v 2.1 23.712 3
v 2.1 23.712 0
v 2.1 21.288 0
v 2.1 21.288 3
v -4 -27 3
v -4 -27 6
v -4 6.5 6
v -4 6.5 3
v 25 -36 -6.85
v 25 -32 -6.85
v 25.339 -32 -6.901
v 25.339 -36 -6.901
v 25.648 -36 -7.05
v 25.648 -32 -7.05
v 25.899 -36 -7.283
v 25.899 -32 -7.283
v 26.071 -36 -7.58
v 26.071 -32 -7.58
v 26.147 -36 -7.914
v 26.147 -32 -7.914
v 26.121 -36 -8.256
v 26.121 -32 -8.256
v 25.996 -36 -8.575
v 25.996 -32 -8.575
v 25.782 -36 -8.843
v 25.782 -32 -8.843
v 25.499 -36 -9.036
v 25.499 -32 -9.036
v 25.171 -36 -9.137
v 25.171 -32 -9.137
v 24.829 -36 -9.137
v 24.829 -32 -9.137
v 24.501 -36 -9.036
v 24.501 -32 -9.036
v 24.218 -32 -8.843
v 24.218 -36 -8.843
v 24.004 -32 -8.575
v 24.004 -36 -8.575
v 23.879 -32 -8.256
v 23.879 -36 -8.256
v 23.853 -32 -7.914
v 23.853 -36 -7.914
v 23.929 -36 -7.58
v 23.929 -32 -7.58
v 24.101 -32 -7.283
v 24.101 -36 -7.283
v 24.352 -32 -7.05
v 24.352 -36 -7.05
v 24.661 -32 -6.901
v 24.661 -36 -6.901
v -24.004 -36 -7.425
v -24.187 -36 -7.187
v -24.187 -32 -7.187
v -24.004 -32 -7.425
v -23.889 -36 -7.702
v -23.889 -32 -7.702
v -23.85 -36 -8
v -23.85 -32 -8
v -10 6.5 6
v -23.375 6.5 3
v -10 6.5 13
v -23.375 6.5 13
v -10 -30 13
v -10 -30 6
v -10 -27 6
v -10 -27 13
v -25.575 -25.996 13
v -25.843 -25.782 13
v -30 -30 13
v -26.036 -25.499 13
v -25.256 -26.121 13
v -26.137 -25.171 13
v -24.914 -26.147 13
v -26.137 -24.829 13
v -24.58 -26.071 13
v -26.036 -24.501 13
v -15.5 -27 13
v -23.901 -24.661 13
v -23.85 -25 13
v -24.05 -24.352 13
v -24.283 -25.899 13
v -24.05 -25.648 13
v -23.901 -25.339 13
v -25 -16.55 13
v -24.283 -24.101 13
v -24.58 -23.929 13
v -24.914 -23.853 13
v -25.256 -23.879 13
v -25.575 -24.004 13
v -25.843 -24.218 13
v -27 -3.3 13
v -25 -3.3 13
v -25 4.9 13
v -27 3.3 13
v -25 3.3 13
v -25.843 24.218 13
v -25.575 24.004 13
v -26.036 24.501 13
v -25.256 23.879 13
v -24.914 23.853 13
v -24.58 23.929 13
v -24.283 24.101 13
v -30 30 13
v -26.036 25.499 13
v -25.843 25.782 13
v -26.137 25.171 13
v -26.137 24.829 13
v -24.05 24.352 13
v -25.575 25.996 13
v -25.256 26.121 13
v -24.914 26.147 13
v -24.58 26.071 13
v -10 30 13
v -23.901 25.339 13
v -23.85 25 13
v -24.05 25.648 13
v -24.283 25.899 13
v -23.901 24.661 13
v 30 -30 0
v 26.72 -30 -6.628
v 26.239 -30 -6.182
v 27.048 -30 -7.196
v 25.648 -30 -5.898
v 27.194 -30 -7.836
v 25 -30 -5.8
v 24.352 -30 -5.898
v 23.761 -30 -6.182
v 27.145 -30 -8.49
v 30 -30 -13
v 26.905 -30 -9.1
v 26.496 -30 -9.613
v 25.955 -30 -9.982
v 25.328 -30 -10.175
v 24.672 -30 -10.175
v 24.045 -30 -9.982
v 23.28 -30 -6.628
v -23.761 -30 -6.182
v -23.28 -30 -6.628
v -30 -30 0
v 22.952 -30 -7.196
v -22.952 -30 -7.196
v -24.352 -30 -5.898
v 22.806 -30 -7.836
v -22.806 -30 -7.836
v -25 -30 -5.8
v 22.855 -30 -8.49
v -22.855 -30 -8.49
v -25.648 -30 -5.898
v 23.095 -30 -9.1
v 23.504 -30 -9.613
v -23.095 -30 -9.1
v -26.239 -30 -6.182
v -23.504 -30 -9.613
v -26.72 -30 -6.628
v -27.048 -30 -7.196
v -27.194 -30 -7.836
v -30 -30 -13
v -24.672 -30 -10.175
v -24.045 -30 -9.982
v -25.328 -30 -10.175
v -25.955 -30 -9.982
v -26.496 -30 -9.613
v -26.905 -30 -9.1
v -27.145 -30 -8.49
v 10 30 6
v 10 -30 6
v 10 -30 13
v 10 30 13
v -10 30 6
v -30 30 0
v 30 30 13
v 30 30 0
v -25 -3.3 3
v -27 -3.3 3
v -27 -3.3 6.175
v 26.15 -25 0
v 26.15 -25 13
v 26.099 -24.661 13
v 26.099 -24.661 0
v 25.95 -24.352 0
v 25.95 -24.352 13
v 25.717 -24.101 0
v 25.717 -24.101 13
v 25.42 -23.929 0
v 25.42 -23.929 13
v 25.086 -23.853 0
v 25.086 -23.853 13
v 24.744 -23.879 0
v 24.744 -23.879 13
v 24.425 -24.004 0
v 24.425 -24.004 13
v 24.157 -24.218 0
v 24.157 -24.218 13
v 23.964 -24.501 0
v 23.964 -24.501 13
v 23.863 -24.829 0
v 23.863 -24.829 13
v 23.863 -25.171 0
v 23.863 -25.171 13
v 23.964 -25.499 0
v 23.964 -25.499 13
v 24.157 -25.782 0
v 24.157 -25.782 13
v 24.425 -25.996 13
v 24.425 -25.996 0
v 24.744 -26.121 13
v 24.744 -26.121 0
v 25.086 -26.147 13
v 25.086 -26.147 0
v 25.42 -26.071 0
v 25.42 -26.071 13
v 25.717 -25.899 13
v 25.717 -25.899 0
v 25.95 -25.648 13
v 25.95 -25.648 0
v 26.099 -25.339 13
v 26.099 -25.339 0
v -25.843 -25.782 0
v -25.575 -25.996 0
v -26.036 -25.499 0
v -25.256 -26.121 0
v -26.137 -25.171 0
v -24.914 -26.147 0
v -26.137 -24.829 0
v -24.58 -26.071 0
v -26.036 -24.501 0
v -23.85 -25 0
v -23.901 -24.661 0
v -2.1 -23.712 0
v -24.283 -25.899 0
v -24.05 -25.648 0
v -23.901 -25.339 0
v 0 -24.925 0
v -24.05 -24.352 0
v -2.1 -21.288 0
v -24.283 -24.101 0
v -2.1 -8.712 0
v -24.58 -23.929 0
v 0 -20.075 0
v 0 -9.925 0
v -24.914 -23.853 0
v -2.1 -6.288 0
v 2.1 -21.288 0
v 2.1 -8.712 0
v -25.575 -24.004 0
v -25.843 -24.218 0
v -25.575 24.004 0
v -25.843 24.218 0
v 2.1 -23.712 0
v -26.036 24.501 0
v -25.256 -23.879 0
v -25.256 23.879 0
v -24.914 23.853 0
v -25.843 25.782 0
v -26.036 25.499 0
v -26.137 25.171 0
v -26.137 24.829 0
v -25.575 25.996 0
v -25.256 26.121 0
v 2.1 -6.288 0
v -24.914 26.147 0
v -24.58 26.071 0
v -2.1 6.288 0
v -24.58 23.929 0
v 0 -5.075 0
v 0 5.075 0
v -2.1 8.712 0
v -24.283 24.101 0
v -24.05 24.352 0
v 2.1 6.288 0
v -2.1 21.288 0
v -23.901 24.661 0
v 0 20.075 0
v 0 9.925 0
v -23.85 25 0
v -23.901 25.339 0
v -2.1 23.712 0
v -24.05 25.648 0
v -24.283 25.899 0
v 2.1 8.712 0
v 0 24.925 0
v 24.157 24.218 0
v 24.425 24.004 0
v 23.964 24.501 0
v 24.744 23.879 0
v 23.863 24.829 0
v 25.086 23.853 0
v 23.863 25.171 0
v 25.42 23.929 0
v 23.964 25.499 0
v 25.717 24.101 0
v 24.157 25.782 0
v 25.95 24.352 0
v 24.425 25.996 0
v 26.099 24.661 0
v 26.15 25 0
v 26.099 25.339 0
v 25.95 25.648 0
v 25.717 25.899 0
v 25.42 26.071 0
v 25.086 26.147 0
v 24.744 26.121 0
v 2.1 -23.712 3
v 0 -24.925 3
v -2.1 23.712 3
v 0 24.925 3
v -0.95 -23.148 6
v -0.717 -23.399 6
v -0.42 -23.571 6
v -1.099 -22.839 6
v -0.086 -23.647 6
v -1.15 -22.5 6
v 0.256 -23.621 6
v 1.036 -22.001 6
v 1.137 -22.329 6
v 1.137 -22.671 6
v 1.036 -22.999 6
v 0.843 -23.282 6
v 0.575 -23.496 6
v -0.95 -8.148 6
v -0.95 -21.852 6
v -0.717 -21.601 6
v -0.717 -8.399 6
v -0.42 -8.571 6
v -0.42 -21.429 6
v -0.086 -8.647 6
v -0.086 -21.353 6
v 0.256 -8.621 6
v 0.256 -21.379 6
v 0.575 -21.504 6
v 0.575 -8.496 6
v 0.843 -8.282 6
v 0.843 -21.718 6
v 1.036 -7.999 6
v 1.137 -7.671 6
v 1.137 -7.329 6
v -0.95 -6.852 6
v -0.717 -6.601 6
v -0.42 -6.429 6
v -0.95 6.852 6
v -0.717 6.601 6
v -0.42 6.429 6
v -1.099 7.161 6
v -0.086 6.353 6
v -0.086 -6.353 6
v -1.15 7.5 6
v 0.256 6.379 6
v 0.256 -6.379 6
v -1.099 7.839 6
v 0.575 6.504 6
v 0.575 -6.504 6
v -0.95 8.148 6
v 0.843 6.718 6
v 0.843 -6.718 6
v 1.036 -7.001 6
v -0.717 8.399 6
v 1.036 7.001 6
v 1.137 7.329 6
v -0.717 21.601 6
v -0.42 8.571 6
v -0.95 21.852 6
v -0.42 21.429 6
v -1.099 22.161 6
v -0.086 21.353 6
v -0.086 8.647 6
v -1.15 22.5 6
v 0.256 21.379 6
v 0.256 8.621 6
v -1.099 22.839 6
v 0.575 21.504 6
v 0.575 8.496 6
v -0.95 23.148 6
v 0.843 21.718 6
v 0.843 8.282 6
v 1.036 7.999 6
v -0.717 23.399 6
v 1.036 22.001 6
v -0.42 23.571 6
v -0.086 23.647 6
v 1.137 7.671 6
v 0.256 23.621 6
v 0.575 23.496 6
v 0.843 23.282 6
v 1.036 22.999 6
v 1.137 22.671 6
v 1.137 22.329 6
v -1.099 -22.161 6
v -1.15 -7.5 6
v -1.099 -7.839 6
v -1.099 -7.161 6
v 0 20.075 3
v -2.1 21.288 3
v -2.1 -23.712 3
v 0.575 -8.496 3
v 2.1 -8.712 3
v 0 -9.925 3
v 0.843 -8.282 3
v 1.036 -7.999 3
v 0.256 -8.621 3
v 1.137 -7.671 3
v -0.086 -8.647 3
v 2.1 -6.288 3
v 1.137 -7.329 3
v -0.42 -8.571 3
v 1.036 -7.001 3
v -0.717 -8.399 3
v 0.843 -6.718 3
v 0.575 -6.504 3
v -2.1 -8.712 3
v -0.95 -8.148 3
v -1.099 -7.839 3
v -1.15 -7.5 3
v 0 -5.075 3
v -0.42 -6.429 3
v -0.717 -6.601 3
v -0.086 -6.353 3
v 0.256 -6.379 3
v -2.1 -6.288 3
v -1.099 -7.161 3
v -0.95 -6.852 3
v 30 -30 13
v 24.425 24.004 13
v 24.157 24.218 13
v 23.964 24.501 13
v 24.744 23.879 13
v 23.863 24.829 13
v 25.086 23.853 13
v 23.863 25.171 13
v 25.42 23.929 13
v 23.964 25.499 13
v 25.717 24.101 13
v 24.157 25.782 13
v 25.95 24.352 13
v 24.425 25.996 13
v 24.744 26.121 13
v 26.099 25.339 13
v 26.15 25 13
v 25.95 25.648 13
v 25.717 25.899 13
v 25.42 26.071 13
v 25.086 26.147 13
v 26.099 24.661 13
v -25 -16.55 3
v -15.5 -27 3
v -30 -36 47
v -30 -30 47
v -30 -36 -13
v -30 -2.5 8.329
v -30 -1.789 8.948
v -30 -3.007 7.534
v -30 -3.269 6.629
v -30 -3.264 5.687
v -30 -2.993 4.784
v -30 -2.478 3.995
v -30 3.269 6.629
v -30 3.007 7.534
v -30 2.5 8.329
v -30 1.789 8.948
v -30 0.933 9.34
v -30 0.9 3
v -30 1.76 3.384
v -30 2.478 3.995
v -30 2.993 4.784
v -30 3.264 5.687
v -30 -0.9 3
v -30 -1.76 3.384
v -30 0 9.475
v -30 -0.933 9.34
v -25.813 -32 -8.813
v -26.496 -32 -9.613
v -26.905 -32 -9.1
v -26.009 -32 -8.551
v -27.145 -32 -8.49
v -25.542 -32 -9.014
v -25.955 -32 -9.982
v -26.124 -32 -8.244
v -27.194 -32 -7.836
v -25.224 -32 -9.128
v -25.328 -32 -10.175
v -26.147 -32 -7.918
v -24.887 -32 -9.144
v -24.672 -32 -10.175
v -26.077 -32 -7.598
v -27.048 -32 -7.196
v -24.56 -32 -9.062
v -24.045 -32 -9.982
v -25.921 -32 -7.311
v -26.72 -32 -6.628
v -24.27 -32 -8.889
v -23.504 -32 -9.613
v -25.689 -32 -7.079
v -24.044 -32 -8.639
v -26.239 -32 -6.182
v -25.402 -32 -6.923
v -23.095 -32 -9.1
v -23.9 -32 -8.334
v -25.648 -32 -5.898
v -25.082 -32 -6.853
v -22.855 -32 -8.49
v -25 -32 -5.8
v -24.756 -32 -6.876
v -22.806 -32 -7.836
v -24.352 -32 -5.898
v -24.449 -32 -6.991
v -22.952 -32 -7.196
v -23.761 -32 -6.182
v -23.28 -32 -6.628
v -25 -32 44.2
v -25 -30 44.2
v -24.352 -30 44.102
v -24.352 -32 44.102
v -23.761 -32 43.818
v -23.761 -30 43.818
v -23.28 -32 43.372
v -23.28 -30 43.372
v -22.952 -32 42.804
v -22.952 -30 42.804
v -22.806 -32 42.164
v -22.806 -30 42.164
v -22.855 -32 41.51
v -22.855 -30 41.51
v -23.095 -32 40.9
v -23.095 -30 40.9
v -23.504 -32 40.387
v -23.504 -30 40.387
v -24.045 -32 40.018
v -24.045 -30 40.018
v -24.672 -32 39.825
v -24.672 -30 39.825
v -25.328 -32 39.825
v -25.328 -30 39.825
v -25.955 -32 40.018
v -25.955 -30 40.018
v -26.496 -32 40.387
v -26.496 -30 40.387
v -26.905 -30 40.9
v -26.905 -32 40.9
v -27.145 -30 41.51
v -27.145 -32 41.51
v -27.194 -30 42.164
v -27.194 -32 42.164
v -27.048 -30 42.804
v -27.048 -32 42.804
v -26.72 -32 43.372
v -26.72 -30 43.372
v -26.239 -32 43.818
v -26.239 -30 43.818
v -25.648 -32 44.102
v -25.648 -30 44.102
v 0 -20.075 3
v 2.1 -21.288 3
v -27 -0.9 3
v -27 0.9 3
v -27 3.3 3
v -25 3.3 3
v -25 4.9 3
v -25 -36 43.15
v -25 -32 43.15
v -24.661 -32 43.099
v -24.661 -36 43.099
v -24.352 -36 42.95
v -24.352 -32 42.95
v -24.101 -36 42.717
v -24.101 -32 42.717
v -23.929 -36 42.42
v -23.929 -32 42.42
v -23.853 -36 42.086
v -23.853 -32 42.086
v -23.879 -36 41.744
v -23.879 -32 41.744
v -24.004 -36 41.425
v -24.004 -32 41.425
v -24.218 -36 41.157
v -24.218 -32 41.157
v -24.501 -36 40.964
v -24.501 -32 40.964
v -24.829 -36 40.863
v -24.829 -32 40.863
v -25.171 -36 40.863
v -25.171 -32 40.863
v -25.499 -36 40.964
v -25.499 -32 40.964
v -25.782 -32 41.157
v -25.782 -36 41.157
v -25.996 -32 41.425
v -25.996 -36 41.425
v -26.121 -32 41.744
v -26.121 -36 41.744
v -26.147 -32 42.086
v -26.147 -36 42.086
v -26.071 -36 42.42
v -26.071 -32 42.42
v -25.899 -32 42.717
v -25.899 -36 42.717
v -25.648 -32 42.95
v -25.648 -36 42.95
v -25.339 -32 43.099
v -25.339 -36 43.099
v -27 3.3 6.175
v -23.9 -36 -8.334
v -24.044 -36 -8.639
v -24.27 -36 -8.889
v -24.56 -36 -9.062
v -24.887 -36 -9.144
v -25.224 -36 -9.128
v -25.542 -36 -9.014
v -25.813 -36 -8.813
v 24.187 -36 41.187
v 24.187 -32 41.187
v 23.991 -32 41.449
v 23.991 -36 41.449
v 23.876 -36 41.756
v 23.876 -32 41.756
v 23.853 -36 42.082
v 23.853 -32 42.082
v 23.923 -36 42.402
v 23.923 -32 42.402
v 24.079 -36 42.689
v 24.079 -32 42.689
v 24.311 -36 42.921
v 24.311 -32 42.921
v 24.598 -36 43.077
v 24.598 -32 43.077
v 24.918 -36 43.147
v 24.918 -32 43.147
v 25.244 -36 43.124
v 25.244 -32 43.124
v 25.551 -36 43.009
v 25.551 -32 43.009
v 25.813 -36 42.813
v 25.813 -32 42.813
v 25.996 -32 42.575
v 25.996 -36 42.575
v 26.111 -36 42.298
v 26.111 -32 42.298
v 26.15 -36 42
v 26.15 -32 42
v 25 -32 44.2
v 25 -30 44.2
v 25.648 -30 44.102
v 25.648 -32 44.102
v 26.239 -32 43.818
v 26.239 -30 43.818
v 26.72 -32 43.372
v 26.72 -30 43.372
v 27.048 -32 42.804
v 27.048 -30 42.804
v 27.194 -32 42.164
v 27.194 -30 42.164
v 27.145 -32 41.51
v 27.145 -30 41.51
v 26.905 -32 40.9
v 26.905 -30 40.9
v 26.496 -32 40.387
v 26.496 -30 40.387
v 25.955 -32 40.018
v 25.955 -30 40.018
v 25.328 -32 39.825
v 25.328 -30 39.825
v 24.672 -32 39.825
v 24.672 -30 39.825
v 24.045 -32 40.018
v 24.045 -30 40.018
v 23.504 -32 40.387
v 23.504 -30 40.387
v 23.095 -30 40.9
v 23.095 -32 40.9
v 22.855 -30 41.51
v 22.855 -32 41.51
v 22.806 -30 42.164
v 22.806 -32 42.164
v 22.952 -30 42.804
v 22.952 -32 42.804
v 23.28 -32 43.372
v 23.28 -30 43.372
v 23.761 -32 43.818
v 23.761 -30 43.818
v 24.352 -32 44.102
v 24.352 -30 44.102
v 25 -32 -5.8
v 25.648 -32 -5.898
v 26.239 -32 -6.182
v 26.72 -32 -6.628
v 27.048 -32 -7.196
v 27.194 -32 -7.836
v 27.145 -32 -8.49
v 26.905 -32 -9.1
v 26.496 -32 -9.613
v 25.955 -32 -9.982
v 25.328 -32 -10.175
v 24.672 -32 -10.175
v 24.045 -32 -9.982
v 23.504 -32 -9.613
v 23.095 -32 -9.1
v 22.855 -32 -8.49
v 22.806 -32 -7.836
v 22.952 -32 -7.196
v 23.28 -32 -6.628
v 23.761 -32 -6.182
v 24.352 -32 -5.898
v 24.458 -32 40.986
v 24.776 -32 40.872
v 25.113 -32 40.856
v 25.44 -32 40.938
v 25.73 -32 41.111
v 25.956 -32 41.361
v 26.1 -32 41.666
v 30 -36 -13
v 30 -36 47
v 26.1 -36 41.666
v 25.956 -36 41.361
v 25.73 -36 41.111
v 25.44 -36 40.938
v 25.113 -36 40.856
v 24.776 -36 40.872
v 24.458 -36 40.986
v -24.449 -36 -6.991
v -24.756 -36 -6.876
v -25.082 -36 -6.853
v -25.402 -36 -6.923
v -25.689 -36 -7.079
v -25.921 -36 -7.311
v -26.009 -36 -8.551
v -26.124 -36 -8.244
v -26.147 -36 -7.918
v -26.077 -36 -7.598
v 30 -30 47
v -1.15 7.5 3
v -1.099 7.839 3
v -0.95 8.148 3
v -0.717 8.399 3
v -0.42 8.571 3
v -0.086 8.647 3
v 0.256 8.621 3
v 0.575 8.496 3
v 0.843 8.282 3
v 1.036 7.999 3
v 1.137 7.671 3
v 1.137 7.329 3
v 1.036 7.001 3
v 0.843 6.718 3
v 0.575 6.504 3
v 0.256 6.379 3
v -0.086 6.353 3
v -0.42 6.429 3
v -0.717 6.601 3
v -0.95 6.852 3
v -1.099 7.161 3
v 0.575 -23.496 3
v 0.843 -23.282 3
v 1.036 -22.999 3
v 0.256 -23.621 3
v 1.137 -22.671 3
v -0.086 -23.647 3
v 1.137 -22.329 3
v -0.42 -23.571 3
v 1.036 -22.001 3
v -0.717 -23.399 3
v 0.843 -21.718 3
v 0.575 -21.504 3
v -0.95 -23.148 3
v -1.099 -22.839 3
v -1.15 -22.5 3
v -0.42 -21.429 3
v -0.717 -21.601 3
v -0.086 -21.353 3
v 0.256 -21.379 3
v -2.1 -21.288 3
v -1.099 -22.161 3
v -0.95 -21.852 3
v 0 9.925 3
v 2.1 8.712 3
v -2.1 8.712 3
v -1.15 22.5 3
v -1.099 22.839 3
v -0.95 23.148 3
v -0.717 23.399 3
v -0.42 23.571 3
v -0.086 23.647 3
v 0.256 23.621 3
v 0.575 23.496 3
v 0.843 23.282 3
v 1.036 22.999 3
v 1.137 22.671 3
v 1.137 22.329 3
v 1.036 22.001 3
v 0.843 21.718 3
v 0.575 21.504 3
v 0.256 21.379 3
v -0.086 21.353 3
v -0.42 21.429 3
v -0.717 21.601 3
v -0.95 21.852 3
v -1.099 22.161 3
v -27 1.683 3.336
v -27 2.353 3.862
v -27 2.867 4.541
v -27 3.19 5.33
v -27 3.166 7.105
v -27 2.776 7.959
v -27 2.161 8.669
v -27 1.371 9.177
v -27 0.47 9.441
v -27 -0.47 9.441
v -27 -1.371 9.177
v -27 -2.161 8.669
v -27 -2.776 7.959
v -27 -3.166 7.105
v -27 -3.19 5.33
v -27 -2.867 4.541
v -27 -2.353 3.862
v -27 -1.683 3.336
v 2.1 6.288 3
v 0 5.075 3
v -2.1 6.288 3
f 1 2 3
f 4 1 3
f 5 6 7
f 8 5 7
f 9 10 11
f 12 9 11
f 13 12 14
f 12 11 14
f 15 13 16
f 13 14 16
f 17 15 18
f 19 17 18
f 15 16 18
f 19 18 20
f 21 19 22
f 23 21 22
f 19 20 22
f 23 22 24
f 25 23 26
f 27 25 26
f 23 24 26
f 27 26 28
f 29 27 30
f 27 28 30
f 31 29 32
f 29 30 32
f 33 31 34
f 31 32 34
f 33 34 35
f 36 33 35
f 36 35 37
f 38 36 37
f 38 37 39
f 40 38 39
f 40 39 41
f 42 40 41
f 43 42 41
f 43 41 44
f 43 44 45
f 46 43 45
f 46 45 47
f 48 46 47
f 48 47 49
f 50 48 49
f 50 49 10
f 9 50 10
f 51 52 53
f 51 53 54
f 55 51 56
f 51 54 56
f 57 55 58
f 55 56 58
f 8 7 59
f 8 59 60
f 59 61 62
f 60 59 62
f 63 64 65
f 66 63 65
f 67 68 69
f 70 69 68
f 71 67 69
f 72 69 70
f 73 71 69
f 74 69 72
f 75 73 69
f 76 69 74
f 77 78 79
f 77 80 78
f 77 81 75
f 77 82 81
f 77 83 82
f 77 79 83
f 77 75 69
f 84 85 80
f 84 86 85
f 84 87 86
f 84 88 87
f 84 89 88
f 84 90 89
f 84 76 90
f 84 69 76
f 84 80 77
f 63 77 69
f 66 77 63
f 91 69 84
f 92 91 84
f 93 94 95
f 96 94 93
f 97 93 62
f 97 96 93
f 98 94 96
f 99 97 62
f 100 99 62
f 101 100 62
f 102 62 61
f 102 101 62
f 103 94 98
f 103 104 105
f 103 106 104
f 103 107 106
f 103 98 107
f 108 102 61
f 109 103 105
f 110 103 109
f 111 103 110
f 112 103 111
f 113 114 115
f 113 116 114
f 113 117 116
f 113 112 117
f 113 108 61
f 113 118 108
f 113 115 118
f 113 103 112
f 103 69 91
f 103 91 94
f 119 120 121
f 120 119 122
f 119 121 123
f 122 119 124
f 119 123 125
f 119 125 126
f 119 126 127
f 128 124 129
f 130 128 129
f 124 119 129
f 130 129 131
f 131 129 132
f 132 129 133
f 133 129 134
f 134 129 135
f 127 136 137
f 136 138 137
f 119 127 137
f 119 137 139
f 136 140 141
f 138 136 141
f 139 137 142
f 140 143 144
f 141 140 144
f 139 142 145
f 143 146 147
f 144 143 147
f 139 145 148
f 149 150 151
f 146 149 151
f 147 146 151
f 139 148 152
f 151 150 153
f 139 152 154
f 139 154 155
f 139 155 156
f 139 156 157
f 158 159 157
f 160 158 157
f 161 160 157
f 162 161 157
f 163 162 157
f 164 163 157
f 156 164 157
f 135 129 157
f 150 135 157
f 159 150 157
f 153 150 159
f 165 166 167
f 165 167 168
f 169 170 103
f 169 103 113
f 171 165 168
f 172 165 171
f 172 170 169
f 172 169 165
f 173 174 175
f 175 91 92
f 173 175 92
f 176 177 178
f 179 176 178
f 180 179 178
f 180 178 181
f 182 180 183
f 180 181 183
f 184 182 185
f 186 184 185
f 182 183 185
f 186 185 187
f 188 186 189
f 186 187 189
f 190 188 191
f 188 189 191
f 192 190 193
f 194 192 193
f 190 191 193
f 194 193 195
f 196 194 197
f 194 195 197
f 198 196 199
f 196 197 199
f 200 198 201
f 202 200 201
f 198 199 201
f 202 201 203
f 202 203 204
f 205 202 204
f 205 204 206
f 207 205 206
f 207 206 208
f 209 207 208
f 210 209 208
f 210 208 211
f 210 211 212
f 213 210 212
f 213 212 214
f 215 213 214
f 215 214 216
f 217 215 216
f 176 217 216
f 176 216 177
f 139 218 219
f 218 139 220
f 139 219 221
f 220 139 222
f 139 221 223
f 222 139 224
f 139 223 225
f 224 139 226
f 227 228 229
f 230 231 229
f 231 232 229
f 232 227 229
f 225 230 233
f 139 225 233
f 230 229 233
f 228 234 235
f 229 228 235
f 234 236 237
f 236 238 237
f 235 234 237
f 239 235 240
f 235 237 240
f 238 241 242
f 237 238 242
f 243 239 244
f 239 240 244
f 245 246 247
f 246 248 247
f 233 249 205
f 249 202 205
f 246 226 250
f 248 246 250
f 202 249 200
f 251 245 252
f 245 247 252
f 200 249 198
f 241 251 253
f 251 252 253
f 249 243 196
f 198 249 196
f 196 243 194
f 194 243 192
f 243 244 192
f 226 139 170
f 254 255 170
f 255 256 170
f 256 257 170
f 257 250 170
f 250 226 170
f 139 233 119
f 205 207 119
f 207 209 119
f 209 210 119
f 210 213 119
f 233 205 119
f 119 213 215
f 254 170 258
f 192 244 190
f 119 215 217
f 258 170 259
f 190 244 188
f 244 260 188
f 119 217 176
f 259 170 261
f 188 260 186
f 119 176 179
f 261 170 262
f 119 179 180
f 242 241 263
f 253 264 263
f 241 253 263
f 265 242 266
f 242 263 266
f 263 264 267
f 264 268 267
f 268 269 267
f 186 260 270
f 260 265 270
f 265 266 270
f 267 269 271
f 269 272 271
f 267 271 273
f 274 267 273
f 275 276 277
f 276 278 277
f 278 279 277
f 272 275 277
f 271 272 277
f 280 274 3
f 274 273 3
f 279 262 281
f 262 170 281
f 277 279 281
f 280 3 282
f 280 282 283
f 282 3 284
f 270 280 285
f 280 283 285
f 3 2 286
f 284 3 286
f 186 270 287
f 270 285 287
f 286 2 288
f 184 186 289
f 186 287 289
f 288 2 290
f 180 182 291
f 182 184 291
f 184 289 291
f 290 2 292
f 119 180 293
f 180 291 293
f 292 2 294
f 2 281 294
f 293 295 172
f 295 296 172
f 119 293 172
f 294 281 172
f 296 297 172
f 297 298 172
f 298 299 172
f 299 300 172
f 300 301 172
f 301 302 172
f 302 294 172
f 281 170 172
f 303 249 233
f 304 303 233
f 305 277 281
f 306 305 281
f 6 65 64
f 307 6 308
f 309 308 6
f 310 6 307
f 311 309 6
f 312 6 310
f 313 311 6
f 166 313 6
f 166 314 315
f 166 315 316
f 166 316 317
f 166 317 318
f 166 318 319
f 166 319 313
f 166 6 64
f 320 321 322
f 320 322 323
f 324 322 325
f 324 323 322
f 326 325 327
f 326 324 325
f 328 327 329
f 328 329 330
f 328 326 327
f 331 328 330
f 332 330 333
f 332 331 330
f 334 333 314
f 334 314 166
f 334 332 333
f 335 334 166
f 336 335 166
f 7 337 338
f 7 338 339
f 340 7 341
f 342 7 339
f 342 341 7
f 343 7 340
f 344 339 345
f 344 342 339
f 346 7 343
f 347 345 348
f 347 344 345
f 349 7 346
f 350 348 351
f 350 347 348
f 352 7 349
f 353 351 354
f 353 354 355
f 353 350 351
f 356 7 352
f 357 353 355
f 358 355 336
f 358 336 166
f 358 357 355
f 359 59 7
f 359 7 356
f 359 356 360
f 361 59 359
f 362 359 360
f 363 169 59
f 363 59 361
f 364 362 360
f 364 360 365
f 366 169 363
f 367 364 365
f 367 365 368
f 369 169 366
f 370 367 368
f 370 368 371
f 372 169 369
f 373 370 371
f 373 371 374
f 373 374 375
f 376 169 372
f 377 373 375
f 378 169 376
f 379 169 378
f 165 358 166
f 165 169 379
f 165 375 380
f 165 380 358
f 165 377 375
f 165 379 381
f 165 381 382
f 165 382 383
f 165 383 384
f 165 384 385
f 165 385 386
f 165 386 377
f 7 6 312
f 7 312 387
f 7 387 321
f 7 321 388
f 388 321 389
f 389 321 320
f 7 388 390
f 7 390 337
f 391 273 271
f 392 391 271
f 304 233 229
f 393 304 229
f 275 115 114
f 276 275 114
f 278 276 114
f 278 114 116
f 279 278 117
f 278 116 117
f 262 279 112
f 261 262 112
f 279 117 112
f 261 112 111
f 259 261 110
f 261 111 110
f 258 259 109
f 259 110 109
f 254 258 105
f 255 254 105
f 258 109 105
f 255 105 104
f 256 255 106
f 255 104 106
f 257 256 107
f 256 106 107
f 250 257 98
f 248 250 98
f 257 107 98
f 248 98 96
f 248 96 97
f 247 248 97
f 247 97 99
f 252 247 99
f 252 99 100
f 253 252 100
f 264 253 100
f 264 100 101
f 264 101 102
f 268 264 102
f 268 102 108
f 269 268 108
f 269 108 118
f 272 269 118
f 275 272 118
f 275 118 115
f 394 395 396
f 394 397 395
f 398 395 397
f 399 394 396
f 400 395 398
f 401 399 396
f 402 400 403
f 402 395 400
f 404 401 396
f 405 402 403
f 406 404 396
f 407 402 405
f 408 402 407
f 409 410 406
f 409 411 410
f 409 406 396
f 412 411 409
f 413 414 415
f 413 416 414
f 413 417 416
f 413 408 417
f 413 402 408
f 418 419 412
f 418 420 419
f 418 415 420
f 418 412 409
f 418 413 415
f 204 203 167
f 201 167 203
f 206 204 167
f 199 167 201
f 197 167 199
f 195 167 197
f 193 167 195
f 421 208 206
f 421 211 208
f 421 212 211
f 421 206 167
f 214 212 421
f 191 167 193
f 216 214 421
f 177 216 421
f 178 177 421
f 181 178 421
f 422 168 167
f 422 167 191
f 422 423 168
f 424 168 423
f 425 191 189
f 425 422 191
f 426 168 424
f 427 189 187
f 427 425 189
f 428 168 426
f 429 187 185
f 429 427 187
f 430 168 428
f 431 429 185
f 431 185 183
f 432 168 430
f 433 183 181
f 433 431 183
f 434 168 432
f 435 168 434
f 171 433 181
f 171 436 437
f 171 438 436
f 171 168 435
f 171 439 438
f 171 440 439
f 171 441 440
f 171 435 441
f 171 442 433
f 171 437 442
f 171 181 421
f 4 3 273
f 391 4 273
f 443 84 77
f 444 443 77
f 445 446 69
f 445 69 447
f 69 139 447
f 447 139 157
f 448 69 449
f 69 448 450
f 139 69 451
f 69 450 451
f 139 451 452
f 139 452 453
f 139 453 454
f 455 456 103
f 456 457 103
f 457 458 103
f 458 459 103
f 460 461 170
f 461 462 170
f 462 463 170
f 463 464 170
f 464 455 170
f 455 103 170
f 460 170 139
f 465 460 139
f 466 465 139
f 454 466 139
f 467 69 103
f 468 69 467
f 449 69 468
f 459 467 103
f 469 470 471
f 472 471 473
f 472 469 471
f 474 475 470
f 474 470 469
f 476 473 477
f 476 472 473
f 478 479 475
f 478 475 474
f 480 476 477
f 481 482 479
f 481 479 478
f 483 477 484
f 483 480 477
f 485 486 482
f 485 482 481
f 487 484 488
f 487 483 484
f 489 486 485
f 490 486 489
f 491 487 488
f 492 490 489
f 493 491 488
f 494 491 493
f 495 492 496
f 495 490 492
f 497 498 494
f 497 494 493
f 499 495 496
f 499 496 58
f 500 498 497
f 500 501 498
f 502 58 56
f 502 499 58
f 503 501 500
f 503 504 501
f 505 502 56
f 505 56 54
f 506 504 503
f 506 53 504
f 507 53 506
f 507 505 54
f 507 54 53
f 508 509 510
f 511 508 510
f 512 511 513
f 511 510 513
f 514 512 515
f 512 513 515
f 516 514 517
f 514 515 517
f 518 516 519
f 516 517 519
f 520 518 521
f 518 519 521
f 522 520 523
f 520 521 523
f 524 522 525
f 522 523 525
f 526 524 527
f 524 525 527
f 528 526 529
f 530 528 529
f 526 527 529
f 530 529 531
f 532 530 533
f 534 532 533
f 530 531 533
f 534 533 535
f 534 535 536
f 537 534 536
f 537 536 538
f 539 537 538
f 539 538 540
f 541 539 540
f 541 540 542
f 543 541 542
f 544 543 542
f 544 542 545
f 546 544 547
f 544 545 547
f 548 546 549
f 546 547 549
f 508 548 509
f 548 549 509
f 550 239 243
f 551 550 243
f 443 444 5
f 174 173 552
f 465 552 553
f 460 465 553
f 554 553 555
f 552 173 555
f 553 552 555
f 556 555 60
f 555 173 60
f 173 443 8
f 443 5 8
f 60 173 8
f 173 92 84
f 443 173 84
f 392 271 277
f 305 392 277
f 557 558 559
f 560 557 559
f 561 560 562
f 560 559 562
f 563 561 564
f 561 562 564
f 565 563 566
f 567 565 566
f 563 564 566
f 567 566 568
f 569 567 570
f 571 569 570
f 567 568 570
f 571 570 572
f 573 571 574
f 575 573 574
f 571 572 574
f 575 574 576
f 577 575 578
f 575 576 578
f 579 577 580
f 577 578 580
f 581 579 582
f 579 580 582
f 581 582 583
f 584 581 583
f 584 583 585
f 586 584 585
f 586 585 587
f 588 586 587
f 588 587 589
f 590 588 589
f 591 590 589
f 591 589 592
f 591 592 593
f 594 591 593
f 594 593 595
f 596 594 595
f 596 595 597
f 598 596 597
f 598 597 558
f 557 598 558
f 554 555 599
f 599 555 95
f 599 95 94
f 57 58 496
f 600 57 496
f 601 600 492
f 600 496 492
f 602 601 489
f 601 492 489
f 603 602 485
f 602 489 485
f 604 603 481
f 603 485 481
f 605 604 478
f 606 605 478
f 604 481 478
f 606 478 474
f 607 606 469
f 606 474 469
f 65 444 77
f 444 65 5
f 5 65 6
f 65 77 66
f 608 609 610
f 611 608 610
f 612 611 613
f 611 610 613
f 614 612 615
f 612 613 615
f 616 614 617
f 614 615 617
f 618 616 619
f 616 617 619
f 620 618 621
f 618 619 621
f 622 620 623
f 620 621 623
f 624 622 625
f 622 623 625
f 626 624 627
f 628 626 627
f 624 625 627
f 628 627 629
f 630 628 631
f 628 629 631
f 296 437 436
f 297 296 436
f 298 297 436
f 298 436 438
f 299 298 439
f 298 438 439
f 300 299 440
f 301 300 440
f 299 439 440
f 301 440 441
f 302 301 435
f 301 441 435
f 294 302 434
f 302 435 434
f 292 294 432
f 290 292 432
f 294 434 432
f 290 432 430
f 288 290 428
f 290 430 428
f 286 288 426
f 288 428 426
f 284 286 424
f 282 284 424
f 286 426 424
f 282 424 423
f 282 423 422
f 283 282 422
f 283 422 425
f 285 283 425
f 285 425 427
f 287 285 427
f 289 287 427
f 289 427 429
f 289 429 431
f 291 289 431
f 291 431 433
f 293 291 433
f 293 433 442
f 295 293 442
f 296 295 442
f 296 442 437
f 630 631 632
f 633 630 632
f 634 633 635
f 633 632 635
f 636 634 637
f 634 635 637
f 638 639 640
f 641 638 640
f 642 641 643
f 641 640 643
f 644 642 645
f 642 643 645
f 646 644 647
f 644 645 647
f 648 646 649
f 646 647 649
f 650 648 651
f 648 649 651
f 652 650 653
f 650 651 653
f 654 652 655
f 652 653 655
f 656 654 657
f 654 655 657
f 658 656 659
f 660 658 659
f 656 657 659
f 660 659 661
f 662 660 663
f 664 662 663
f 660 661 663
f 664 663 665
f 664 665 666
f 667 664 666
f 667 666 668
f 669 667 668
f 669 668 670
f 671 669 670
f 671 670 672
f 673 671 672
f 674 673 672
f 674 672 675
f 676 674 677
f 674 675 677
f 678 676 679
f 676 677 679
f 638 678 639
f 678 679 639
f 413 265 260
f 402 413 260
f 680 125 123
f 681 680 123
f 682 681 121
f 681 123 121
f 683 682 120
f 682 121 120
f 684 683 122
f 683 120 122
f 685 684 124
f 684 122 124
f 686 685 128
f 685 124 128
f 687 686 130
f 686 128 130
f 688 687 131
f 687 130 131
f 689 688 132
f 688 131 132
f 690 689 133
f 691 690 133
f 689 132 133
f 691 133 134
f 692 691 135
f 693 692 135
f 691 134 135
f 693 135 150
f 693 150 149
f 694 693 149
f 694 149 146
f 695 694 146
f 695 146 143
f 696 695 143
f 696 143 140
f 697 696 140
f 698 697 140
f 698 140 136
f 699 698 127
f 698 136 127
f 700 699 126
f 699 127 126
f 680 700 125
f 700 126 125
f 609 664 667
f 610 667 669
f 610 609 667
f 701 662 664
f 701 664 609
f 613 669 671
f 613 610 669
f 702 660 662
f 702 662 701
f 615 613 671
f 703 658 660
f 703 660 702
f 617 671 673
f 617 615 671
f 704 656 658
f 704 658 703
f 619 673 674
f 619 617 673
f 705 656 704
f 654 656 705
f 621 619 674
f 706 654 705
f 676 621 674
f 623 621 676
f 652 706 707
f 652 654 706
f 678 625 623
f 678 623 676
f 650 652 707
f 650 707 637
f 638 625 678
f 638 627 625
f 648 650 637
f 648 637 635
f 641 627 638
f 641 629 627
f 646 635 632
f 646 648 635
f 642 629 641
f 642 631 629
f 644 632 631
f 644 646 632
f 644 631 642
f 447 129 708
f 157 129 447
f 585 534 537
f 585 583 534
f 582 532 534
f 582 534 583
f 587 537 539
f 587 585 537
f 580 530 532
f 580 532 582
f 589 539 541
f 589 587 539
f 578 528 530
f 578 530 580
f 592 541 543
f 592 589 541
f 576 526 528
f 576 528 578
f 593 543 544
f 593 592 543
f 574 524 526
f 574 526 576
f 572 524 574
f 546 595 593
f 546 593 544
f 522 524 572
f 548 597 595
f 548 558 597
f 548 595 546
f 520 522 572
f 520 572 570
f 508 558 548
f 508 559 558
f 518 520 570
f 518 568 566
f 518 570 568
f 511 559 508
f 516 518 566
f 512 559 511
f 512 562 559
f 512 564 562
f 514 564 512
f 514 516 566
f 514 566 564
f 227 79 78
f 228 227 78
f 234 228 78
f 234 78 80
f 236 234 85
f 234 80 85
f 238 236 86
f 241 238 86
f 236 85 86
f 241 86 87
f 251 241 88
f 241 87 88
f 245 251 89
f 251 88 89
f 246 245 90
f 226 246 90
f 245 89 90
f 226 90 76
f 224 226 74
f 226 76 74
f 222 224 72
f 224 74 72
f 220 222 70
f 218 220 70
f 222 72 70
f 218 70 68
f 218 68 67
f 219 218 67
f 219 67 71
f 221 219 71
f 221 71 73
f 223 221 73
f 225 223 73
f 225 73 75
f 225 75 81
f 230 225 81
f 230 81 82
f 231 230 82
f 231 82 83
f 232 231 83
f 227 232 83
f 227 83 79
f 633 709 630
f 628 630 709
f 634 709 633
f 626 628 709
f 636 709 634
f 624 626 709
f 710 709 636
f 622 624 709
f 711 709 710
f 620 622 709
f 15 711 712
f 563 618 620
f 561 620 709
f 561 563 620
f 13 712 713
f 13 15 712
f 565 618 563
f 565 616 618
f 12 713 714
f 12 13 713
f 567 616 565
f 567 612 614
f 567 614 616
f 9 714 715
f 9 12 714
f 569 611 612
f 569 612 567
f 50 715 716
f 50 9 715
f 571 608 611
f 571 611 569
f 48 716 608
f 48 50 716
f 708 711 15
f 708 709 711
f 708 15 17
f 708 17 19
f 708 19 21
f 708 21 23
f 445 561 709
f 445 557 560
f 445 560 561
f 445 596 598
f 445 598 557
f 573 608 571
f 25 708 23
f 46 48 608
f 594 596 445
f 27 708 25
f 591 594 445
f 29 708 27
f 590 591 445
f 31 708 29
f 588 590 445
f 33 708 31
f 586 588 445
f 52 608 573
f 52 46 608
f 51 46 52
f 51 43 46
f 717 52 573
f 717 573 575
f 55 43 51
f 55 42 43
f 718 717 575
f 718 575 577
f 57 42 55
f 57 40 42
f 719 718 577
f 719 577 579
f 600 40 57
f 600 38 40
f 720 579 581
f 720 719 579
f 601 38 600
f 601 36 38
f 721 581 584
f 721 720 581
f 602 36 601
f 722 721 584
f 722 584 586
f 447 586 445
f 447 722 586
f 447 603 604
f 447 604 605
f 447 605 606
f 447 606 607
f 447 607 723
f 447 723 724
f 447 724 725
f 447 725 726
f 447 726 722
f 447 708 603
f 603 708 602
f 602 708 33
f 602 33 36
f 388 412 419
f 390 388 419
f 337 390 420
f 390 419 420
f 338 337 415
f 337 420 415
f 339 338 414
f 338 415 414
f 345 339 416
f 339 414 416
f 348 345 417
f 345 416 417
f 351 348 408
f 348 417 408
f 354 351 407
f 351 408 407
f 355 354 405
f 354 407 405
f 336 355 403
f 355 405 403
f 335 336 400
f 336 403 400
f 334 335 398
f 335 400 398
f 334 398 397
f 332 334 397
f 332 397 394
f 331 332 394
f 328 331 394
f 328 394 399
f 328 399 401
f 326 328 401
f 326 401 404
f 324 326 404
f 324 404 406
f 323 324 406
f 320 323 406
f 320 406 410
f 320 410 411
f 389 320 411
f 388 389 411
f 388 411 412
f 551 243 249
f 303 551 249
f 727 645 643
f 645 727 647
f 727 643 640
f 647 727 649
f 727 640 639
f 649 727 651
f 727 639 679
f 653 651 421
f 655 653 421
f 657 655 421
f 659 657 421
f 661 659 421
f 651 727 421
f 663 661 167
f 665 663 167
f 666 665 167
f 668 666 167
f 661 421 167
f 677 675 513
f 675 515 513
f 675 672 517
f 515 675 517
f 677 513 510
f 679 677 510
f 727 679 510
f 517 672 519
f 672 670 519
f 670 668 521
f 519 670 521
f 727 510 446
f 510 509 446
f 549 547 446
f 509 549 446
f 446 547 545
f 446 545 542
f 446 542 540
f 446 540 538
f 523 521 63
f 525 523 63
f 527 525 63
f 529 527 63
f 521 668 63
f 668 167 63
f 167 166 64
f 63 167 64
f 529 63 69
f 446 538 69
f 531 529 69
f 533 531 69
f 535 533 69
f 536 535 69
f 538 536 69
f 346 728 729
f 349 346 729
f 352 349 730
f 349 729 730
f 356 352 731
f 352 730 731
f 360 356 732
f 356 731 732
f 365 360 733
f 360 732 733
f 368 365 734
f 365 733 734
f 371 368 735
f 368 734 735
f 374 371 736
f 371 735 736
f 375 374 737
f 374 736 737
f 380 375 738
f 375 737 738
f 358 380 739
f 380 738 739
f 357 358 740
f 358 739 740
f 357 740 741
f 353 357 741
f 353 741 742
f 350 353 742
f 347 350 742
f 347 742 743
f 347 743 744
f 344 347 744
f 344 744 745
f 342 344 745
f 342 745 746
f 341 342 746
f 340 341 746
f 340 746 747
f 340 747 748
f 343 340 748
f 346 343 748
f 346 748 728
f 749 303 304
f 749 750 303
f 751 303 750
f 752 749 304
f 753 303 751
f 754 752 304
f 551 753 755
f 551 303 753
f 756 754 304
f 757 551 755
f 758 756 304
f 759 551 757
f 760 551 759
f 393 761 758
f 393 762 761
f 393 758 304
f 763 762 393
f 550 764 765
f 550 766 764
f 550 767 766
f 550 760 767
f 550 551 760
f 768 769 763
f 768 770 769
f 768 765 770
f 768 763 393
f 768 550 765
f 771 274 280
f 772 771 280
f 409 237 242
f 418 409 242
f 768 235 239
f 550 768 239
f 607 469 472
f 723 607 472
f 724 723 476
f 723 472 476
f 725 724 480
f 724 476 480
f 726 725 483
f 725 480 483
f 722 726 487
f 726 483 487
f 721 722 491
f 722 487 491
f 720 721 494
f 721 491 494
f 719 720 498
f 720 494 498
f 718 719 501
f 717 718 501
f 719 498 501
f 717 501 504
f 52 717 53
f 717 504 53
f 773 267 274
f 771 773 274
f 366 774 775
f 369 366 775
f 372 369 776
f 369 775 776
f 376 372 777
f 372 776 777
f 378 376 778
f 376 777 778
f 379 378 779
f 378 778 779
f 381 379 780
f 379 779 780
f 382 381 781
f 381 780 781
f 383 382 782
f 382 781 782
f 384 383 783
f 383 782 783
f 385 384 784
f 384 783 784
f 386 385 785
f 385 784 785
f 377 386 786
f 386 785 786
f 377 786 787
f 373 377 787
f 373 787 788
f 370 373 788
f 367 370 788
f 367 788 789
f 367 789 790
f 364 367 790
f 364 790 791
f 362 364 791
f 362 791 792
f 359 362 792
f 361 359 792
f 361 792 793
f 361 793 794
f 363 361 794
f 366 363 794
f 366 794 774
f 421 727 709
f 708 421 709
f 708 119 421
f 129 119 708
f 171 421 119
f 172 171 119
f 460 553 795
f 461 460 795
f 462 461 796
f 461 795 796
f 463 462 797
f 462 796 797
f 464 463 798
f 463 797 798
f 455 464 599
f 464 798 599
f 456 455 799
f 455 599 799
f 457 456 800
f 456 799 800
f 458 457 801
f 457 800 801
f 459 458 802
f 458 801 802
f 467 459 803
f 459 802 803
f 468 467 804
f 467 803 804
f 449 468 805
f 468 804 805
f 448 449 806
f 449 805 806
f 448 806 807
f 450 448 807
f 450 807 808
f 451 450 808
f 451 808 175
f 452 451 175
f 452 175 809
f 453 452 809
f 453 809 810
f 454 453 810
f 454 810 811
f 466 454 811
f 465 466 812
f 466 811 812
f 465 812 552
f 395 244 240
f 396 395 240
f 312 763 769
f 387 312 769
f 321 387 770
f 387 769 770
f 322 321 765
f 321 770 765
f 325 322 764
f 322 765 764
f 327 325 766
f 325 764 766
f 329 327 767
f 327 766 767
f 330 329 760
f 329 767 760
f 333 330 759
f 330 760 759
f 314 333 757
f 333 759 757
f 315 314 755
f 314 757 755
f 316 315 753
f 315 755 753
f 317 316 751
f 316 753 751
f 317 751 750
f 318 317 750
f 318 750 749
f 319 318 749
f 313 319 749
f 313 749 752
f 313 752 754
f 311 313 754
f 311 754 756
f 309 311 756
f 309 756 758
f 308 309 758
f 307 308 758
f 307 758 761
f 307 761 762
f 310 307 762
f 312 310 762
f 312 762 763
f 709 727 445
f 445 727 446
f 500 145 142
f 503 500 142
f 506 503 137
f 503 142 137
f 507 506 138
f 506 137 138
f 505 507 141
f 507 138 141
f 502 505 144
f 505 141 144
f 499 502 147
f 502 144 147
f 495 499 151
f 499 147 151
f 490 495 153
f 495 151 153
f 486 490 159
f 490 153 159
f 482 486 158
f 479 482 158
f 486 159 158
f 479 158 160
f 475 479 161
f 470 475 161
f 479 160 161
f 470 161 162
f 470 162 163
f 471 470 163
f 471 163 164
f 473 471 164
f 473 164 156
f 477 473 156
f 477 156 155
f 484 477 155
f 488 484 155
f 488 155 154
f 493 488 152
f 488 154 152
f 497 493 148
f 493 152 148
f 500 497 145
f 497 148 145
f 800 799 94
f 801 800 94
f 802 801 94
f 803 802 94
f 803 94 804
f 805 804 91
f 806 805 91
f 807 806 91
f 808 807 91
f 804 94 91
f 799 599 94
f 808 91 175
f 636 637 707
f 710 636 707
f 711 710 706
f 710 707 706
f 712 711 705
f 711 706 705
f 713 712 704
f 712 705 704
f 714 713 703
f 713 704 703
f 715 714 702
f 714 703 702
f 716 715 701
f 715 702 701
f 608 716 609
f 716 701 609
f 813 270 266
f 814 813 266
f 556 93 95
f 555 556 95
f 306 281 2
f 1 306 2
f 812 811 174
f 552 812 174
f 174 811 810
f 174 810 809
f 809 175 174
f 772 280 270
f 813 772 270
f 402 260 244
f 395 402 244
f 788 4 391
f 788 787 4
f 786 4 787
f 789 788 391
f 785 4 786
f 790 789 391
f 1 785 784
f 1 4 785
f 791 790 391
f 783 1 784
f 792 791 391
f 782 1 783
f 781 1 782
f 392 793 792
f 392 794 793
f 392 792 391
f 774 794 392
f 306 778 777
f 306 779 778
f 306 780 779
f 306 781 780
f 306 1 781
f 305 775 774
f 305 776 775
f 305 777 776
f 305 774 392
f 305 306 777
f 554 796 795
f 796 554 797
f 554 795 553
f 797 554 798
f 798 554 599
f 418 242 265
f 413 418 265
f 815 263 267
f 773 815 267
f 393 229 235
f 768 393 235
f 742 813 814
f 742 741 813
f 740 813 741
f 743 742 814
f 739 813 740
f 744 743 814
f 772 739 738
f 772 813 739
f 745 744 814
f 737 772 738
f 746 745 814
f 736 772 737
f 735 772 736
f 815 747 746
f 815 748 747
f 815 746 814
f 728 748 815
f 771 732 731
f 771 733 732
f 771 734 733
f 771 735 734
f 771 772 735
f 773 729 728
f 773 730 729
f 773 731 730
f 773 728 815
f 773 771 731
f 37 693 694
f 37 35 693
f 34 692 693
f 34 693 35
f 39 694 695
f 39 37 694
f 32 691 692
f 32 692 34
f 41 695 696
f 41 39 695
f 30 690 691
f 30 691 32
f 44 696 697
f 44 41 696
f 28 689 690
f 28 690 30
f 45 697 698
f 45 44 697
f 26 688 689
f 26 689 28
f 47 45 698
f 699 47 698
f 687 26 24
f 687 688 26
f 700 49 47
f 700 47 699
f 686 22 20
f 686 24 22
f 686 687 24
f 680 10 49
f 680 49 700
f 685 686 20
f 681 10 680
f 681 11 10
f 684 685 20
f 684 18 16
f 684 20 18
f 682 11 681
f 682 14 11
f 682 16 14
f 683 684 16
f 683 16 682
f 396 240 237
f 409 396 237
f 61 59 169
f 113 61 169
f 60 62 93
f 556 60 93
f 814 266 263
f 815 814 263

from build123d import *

# Parameters (mm, degrees)
SKETCH1_W           = 60
SKETCH1_H           = 60
BOSS_EXTRUDE1_DEPTH = 6
CUT_EXTRUDE2_DEPTH  = 3
SKETCH12_R          = 1.15
CUT_EXTRUDE9_DEPTH  = 43.848570571
SKETCH5_W           = 20
SKETCH5_H           = 60
BOSS_EXTRUDE2_DEPTH = 7
SKETCH6_R           = 1.15
CUT_EXTRUDE4_DEPTH  = 45.373415465
CUT_EXTRUDE6_DEPTH  = 10
SKETCH10_W          = 6
SKETCH10_H          = 33.5
CUT_EXTRUDE7_DEPTH  = 3
CUT_EXTRUDE8_DEPTH  = 66.711490624
SKETCH13_W          = 60
SKETCH13_H          = 60
BOSS_EXTRUDE3_DEPTH = 6
SKETCH14_R          = 1.15
CUT_EXTRUDE10_DEPTH = 82.908485519
SKETCH15_R          = 2.2
CUT_EXTRUDE11_DEPTH = 2


with BuildPart() as part:
    # Sketch1 → Boss-Extrude1 (new body)
    with BuildSketch(Plane.XY):
        Rectangle(SKETCH1_W, SKETCH1_H)
    extrude(amount=BOSS_EXTRUDE1_DEPTH)

    # Sketch3 → Cut-Extrude2 (cut)
    with BuildSketch(Plane(origin=(0, 0, 0), x_dir=(-1, 0, 0), z_dir=(0, 0, -1))):
        Polygon((2.1, 6.287564435), (2.1, 8.712435565), (0, 9.924871131), (-2.1, 8.712435565), (-2.1, 6.287564435), (0, 5.075128869), align=None)
        Polygon((2.1, -8.712435565), (2.1, -6.287564435), (0, -5.075128869), (-2.1, -6.287564435), (-2.1, -8.712435565), (0, -9.924871131), align=None)
        Polygon((2.1, -23.712435565), (2.1, -21.287564435), (0, -20.075128869), (-2.1, -21.287564435), (-2.1, -23.712435565), (0, -24.924871131), align=None)
        Polygon((0, 20.075128869), (2.1, 21.287564435), (2.1, 23.712435565), (0, 24.924871131), (-2.1, 23.712435565), (-2.1, 21.287564435), align=None)
    extrude(amount=-CUT_EXTRUDE2_DEPTH, mode=Mode.SUBTRACT)

    # Sketch12 → Cut-Extrude9 (cut, through all)
    with BuildSketch(Plane(origin=(0, 0, 0), x_dir=(-1, 0, 0), z_dir=(0, 0, -1))):
        with Locations((0, 22.5)):
            Circle(SKETCH12_R)
        with Locations((0, 7.5)):
            Circle(SKETCH12_R)
        with Locations((0, -7.5)):
            Circle(SKETCH12_R)
        with Locations((0, -22.5)):
            Circle(SKETCH12_R)
    extrude(amount=-CUT_EXTRUDE9_DEPTH, mode=Mode.SUBTRACT)

    # Sketch5 → Boss-Extrude2 (add)
    with BuildSketch(Plane.XY.offset(6)):
        with Locations((-20, 0)):
            Rectangle(SKETCH5_W, SKETCH5_H)
        with Locations((20, 0)):
            Rectangle(SKETCH5_W, SKETCH5_H)
    extrude(amount=BOSS_EXTRUDE2_DEPTH)

    # Sketch6 → Cut-Extrude4 (cut, through all)
    with BuildSketch(Plane.XY.offset(13)):
        with Locations((-25, 25)):
            Circle(SKETCH6_R)
        with Locations((25, 25)):
            Circle(SKETCH6_R)
        with Locations((25, -25)):
            Circle(SKETCH6_R)
        with Locations((-25, -25)):
            Circle(SKETCH6_R)
    extrude(amount=-CUT_EXTRUDE4_DEPTH, mode=Mode.SUBTRACT)

    # Sketch9 → Cut-Extrude6 (cut)
    with BuildSketch(Plane.XY.offset(13)):
        Polygon((-25, -16.55), (-15.5, -27), (-10, -27), (-10, 6.5), (-23.375, 6.5), (-25, 4.9), (-25, 3.3), (-27, 3.3), (-27, -3.3), (-25, -3.3), align=None)
    extrude(amount=-CUT_EXTRUDE6_DEPTH, mode=Mode.SUBTRACT)

    # Sketch10 → Cut-Extrude7 (cut)
    with BuildSketch(Plane.XY.offset(6)):
        with Locations((-7, -10.25)):
            Rectangle(SKETCH10_W, SKETCH10_H)
    extrude(amount=-CUT_EXTRUDE7_DEPTH, mode=Mode.SUBTRACT)

    # Sketch11 → Cut-Extrude8 (cut, through all)
    with BuildSketch(Plane(origin=(-27, 0, 0), x_dir=(0, 0, -1), z_dir=(1, 0, 0))):
        with BuildLine():
            Line((-3, -0.899652711), (-3, 0.899652711))
            ThreePointArc((-3, 0.899652711), (-9.475, 0), (-3, -0.899652711))
        make_face()
    extrude(amount=-CUT_EXTRUDE8_DEPTH, mode=Mode.SUBTRACT)

    # Sketch13 → Boss-Extrude3 (add)
    with BuildSketch(Plane(origin=(0, -30, 0), x_dir=(-1, 0, 0), z_dir=(0, -1, 0))):
        with Locations((0, -17)):
            Rectangle(SKETCH13_W, SKETCH13_H)
    extrude(amount=BOSS_EXTRUDE3_DEPTH)

    # Sketch14 → Cut-Extrude10 (cut, through all)
    with BuildSketch(Plane(origin=(0, -30, 0), x_dir=(1, 0, 0), z_dir=(0, 1, 0))):
        with BuildLine():
            ThreePointArc((-25.813172798, 8.813172798), (-25.813172798, 7.186827202), (-24.186827202, 7.186827202))
            Line((-24.186827202, 7.186827202), (-25.813172798, 8.813172798))
        make_face()
        with BuildLine():
            Line((-25.813172798, 8.813172798), (-24.186827202, 7.186827202))
            ThreePointArc((-24.186827202, 7.186827202), (-23.937538538, 7.559914053), (-23.85, 8))
            ThreePointArc((-23.85, 8), (-24.559914053, 9.062461462), (-25.813172798, 8.813172798))
        make_face()
        with Locations(Location((25, 8, 0), (0, 0, 270))):
            Circle(SKETCH14_R)
        with BuildLine():
            ThreePointArc((26.15, -42), (25.440085947, -40.937538538), (24.186827202, -41.186827202))
            Line((24.186827202, -41.186827202), (25.813172798, -42.813172798))
            ThreePointArc((25.813172798, -42.813172798), (26.062461462, -42.440085947), (26.15, -42))
        make_face()
        with BuildLine():
            Line((25.813172798, -42.813172798), (24.186827202, -41.186827202))
            ThreePointArc((24.186827202, -41.186827202), (24.186827202, -42.813172798), (25.813172798, -42.813172798))
        make_face()
        with Locations(Location((-25, -42, 0), (0, 0, 270))):
            Circle(SKETCH14_R)
    extrude(amount=-CUT_EXTRUDE10_DEPTH, mode=Mode.SUBTRACT)

    # Sketch15 → Cut-Extrude11 (cut)
    with BuildSketch(Plane(origin=(0, -30, 0), x_dir=(1, 0, 0), z_dir=(0, 1, 0))):
        with Locations(Location((25, -42, 0), (0, 0, 270))):
            Circle(SKETCH15_R)
        with Locations(Location((-25, -42, 0), (0, 0, 270))):
            Circle(SKETCH15_R)
        with Locations(Location((-25, 8, 0), (0, 0, 270))):
            Circle(SKETCH15_R)
        with Locations(Location((25, 8, 0), (0, 0, 270))):
            Circle(SKETCH15_R)
    extrude(amount=-CUT_EXTRUDE11_DEPTH, mode=Mode.SUBTRACT)


solid = part.part
